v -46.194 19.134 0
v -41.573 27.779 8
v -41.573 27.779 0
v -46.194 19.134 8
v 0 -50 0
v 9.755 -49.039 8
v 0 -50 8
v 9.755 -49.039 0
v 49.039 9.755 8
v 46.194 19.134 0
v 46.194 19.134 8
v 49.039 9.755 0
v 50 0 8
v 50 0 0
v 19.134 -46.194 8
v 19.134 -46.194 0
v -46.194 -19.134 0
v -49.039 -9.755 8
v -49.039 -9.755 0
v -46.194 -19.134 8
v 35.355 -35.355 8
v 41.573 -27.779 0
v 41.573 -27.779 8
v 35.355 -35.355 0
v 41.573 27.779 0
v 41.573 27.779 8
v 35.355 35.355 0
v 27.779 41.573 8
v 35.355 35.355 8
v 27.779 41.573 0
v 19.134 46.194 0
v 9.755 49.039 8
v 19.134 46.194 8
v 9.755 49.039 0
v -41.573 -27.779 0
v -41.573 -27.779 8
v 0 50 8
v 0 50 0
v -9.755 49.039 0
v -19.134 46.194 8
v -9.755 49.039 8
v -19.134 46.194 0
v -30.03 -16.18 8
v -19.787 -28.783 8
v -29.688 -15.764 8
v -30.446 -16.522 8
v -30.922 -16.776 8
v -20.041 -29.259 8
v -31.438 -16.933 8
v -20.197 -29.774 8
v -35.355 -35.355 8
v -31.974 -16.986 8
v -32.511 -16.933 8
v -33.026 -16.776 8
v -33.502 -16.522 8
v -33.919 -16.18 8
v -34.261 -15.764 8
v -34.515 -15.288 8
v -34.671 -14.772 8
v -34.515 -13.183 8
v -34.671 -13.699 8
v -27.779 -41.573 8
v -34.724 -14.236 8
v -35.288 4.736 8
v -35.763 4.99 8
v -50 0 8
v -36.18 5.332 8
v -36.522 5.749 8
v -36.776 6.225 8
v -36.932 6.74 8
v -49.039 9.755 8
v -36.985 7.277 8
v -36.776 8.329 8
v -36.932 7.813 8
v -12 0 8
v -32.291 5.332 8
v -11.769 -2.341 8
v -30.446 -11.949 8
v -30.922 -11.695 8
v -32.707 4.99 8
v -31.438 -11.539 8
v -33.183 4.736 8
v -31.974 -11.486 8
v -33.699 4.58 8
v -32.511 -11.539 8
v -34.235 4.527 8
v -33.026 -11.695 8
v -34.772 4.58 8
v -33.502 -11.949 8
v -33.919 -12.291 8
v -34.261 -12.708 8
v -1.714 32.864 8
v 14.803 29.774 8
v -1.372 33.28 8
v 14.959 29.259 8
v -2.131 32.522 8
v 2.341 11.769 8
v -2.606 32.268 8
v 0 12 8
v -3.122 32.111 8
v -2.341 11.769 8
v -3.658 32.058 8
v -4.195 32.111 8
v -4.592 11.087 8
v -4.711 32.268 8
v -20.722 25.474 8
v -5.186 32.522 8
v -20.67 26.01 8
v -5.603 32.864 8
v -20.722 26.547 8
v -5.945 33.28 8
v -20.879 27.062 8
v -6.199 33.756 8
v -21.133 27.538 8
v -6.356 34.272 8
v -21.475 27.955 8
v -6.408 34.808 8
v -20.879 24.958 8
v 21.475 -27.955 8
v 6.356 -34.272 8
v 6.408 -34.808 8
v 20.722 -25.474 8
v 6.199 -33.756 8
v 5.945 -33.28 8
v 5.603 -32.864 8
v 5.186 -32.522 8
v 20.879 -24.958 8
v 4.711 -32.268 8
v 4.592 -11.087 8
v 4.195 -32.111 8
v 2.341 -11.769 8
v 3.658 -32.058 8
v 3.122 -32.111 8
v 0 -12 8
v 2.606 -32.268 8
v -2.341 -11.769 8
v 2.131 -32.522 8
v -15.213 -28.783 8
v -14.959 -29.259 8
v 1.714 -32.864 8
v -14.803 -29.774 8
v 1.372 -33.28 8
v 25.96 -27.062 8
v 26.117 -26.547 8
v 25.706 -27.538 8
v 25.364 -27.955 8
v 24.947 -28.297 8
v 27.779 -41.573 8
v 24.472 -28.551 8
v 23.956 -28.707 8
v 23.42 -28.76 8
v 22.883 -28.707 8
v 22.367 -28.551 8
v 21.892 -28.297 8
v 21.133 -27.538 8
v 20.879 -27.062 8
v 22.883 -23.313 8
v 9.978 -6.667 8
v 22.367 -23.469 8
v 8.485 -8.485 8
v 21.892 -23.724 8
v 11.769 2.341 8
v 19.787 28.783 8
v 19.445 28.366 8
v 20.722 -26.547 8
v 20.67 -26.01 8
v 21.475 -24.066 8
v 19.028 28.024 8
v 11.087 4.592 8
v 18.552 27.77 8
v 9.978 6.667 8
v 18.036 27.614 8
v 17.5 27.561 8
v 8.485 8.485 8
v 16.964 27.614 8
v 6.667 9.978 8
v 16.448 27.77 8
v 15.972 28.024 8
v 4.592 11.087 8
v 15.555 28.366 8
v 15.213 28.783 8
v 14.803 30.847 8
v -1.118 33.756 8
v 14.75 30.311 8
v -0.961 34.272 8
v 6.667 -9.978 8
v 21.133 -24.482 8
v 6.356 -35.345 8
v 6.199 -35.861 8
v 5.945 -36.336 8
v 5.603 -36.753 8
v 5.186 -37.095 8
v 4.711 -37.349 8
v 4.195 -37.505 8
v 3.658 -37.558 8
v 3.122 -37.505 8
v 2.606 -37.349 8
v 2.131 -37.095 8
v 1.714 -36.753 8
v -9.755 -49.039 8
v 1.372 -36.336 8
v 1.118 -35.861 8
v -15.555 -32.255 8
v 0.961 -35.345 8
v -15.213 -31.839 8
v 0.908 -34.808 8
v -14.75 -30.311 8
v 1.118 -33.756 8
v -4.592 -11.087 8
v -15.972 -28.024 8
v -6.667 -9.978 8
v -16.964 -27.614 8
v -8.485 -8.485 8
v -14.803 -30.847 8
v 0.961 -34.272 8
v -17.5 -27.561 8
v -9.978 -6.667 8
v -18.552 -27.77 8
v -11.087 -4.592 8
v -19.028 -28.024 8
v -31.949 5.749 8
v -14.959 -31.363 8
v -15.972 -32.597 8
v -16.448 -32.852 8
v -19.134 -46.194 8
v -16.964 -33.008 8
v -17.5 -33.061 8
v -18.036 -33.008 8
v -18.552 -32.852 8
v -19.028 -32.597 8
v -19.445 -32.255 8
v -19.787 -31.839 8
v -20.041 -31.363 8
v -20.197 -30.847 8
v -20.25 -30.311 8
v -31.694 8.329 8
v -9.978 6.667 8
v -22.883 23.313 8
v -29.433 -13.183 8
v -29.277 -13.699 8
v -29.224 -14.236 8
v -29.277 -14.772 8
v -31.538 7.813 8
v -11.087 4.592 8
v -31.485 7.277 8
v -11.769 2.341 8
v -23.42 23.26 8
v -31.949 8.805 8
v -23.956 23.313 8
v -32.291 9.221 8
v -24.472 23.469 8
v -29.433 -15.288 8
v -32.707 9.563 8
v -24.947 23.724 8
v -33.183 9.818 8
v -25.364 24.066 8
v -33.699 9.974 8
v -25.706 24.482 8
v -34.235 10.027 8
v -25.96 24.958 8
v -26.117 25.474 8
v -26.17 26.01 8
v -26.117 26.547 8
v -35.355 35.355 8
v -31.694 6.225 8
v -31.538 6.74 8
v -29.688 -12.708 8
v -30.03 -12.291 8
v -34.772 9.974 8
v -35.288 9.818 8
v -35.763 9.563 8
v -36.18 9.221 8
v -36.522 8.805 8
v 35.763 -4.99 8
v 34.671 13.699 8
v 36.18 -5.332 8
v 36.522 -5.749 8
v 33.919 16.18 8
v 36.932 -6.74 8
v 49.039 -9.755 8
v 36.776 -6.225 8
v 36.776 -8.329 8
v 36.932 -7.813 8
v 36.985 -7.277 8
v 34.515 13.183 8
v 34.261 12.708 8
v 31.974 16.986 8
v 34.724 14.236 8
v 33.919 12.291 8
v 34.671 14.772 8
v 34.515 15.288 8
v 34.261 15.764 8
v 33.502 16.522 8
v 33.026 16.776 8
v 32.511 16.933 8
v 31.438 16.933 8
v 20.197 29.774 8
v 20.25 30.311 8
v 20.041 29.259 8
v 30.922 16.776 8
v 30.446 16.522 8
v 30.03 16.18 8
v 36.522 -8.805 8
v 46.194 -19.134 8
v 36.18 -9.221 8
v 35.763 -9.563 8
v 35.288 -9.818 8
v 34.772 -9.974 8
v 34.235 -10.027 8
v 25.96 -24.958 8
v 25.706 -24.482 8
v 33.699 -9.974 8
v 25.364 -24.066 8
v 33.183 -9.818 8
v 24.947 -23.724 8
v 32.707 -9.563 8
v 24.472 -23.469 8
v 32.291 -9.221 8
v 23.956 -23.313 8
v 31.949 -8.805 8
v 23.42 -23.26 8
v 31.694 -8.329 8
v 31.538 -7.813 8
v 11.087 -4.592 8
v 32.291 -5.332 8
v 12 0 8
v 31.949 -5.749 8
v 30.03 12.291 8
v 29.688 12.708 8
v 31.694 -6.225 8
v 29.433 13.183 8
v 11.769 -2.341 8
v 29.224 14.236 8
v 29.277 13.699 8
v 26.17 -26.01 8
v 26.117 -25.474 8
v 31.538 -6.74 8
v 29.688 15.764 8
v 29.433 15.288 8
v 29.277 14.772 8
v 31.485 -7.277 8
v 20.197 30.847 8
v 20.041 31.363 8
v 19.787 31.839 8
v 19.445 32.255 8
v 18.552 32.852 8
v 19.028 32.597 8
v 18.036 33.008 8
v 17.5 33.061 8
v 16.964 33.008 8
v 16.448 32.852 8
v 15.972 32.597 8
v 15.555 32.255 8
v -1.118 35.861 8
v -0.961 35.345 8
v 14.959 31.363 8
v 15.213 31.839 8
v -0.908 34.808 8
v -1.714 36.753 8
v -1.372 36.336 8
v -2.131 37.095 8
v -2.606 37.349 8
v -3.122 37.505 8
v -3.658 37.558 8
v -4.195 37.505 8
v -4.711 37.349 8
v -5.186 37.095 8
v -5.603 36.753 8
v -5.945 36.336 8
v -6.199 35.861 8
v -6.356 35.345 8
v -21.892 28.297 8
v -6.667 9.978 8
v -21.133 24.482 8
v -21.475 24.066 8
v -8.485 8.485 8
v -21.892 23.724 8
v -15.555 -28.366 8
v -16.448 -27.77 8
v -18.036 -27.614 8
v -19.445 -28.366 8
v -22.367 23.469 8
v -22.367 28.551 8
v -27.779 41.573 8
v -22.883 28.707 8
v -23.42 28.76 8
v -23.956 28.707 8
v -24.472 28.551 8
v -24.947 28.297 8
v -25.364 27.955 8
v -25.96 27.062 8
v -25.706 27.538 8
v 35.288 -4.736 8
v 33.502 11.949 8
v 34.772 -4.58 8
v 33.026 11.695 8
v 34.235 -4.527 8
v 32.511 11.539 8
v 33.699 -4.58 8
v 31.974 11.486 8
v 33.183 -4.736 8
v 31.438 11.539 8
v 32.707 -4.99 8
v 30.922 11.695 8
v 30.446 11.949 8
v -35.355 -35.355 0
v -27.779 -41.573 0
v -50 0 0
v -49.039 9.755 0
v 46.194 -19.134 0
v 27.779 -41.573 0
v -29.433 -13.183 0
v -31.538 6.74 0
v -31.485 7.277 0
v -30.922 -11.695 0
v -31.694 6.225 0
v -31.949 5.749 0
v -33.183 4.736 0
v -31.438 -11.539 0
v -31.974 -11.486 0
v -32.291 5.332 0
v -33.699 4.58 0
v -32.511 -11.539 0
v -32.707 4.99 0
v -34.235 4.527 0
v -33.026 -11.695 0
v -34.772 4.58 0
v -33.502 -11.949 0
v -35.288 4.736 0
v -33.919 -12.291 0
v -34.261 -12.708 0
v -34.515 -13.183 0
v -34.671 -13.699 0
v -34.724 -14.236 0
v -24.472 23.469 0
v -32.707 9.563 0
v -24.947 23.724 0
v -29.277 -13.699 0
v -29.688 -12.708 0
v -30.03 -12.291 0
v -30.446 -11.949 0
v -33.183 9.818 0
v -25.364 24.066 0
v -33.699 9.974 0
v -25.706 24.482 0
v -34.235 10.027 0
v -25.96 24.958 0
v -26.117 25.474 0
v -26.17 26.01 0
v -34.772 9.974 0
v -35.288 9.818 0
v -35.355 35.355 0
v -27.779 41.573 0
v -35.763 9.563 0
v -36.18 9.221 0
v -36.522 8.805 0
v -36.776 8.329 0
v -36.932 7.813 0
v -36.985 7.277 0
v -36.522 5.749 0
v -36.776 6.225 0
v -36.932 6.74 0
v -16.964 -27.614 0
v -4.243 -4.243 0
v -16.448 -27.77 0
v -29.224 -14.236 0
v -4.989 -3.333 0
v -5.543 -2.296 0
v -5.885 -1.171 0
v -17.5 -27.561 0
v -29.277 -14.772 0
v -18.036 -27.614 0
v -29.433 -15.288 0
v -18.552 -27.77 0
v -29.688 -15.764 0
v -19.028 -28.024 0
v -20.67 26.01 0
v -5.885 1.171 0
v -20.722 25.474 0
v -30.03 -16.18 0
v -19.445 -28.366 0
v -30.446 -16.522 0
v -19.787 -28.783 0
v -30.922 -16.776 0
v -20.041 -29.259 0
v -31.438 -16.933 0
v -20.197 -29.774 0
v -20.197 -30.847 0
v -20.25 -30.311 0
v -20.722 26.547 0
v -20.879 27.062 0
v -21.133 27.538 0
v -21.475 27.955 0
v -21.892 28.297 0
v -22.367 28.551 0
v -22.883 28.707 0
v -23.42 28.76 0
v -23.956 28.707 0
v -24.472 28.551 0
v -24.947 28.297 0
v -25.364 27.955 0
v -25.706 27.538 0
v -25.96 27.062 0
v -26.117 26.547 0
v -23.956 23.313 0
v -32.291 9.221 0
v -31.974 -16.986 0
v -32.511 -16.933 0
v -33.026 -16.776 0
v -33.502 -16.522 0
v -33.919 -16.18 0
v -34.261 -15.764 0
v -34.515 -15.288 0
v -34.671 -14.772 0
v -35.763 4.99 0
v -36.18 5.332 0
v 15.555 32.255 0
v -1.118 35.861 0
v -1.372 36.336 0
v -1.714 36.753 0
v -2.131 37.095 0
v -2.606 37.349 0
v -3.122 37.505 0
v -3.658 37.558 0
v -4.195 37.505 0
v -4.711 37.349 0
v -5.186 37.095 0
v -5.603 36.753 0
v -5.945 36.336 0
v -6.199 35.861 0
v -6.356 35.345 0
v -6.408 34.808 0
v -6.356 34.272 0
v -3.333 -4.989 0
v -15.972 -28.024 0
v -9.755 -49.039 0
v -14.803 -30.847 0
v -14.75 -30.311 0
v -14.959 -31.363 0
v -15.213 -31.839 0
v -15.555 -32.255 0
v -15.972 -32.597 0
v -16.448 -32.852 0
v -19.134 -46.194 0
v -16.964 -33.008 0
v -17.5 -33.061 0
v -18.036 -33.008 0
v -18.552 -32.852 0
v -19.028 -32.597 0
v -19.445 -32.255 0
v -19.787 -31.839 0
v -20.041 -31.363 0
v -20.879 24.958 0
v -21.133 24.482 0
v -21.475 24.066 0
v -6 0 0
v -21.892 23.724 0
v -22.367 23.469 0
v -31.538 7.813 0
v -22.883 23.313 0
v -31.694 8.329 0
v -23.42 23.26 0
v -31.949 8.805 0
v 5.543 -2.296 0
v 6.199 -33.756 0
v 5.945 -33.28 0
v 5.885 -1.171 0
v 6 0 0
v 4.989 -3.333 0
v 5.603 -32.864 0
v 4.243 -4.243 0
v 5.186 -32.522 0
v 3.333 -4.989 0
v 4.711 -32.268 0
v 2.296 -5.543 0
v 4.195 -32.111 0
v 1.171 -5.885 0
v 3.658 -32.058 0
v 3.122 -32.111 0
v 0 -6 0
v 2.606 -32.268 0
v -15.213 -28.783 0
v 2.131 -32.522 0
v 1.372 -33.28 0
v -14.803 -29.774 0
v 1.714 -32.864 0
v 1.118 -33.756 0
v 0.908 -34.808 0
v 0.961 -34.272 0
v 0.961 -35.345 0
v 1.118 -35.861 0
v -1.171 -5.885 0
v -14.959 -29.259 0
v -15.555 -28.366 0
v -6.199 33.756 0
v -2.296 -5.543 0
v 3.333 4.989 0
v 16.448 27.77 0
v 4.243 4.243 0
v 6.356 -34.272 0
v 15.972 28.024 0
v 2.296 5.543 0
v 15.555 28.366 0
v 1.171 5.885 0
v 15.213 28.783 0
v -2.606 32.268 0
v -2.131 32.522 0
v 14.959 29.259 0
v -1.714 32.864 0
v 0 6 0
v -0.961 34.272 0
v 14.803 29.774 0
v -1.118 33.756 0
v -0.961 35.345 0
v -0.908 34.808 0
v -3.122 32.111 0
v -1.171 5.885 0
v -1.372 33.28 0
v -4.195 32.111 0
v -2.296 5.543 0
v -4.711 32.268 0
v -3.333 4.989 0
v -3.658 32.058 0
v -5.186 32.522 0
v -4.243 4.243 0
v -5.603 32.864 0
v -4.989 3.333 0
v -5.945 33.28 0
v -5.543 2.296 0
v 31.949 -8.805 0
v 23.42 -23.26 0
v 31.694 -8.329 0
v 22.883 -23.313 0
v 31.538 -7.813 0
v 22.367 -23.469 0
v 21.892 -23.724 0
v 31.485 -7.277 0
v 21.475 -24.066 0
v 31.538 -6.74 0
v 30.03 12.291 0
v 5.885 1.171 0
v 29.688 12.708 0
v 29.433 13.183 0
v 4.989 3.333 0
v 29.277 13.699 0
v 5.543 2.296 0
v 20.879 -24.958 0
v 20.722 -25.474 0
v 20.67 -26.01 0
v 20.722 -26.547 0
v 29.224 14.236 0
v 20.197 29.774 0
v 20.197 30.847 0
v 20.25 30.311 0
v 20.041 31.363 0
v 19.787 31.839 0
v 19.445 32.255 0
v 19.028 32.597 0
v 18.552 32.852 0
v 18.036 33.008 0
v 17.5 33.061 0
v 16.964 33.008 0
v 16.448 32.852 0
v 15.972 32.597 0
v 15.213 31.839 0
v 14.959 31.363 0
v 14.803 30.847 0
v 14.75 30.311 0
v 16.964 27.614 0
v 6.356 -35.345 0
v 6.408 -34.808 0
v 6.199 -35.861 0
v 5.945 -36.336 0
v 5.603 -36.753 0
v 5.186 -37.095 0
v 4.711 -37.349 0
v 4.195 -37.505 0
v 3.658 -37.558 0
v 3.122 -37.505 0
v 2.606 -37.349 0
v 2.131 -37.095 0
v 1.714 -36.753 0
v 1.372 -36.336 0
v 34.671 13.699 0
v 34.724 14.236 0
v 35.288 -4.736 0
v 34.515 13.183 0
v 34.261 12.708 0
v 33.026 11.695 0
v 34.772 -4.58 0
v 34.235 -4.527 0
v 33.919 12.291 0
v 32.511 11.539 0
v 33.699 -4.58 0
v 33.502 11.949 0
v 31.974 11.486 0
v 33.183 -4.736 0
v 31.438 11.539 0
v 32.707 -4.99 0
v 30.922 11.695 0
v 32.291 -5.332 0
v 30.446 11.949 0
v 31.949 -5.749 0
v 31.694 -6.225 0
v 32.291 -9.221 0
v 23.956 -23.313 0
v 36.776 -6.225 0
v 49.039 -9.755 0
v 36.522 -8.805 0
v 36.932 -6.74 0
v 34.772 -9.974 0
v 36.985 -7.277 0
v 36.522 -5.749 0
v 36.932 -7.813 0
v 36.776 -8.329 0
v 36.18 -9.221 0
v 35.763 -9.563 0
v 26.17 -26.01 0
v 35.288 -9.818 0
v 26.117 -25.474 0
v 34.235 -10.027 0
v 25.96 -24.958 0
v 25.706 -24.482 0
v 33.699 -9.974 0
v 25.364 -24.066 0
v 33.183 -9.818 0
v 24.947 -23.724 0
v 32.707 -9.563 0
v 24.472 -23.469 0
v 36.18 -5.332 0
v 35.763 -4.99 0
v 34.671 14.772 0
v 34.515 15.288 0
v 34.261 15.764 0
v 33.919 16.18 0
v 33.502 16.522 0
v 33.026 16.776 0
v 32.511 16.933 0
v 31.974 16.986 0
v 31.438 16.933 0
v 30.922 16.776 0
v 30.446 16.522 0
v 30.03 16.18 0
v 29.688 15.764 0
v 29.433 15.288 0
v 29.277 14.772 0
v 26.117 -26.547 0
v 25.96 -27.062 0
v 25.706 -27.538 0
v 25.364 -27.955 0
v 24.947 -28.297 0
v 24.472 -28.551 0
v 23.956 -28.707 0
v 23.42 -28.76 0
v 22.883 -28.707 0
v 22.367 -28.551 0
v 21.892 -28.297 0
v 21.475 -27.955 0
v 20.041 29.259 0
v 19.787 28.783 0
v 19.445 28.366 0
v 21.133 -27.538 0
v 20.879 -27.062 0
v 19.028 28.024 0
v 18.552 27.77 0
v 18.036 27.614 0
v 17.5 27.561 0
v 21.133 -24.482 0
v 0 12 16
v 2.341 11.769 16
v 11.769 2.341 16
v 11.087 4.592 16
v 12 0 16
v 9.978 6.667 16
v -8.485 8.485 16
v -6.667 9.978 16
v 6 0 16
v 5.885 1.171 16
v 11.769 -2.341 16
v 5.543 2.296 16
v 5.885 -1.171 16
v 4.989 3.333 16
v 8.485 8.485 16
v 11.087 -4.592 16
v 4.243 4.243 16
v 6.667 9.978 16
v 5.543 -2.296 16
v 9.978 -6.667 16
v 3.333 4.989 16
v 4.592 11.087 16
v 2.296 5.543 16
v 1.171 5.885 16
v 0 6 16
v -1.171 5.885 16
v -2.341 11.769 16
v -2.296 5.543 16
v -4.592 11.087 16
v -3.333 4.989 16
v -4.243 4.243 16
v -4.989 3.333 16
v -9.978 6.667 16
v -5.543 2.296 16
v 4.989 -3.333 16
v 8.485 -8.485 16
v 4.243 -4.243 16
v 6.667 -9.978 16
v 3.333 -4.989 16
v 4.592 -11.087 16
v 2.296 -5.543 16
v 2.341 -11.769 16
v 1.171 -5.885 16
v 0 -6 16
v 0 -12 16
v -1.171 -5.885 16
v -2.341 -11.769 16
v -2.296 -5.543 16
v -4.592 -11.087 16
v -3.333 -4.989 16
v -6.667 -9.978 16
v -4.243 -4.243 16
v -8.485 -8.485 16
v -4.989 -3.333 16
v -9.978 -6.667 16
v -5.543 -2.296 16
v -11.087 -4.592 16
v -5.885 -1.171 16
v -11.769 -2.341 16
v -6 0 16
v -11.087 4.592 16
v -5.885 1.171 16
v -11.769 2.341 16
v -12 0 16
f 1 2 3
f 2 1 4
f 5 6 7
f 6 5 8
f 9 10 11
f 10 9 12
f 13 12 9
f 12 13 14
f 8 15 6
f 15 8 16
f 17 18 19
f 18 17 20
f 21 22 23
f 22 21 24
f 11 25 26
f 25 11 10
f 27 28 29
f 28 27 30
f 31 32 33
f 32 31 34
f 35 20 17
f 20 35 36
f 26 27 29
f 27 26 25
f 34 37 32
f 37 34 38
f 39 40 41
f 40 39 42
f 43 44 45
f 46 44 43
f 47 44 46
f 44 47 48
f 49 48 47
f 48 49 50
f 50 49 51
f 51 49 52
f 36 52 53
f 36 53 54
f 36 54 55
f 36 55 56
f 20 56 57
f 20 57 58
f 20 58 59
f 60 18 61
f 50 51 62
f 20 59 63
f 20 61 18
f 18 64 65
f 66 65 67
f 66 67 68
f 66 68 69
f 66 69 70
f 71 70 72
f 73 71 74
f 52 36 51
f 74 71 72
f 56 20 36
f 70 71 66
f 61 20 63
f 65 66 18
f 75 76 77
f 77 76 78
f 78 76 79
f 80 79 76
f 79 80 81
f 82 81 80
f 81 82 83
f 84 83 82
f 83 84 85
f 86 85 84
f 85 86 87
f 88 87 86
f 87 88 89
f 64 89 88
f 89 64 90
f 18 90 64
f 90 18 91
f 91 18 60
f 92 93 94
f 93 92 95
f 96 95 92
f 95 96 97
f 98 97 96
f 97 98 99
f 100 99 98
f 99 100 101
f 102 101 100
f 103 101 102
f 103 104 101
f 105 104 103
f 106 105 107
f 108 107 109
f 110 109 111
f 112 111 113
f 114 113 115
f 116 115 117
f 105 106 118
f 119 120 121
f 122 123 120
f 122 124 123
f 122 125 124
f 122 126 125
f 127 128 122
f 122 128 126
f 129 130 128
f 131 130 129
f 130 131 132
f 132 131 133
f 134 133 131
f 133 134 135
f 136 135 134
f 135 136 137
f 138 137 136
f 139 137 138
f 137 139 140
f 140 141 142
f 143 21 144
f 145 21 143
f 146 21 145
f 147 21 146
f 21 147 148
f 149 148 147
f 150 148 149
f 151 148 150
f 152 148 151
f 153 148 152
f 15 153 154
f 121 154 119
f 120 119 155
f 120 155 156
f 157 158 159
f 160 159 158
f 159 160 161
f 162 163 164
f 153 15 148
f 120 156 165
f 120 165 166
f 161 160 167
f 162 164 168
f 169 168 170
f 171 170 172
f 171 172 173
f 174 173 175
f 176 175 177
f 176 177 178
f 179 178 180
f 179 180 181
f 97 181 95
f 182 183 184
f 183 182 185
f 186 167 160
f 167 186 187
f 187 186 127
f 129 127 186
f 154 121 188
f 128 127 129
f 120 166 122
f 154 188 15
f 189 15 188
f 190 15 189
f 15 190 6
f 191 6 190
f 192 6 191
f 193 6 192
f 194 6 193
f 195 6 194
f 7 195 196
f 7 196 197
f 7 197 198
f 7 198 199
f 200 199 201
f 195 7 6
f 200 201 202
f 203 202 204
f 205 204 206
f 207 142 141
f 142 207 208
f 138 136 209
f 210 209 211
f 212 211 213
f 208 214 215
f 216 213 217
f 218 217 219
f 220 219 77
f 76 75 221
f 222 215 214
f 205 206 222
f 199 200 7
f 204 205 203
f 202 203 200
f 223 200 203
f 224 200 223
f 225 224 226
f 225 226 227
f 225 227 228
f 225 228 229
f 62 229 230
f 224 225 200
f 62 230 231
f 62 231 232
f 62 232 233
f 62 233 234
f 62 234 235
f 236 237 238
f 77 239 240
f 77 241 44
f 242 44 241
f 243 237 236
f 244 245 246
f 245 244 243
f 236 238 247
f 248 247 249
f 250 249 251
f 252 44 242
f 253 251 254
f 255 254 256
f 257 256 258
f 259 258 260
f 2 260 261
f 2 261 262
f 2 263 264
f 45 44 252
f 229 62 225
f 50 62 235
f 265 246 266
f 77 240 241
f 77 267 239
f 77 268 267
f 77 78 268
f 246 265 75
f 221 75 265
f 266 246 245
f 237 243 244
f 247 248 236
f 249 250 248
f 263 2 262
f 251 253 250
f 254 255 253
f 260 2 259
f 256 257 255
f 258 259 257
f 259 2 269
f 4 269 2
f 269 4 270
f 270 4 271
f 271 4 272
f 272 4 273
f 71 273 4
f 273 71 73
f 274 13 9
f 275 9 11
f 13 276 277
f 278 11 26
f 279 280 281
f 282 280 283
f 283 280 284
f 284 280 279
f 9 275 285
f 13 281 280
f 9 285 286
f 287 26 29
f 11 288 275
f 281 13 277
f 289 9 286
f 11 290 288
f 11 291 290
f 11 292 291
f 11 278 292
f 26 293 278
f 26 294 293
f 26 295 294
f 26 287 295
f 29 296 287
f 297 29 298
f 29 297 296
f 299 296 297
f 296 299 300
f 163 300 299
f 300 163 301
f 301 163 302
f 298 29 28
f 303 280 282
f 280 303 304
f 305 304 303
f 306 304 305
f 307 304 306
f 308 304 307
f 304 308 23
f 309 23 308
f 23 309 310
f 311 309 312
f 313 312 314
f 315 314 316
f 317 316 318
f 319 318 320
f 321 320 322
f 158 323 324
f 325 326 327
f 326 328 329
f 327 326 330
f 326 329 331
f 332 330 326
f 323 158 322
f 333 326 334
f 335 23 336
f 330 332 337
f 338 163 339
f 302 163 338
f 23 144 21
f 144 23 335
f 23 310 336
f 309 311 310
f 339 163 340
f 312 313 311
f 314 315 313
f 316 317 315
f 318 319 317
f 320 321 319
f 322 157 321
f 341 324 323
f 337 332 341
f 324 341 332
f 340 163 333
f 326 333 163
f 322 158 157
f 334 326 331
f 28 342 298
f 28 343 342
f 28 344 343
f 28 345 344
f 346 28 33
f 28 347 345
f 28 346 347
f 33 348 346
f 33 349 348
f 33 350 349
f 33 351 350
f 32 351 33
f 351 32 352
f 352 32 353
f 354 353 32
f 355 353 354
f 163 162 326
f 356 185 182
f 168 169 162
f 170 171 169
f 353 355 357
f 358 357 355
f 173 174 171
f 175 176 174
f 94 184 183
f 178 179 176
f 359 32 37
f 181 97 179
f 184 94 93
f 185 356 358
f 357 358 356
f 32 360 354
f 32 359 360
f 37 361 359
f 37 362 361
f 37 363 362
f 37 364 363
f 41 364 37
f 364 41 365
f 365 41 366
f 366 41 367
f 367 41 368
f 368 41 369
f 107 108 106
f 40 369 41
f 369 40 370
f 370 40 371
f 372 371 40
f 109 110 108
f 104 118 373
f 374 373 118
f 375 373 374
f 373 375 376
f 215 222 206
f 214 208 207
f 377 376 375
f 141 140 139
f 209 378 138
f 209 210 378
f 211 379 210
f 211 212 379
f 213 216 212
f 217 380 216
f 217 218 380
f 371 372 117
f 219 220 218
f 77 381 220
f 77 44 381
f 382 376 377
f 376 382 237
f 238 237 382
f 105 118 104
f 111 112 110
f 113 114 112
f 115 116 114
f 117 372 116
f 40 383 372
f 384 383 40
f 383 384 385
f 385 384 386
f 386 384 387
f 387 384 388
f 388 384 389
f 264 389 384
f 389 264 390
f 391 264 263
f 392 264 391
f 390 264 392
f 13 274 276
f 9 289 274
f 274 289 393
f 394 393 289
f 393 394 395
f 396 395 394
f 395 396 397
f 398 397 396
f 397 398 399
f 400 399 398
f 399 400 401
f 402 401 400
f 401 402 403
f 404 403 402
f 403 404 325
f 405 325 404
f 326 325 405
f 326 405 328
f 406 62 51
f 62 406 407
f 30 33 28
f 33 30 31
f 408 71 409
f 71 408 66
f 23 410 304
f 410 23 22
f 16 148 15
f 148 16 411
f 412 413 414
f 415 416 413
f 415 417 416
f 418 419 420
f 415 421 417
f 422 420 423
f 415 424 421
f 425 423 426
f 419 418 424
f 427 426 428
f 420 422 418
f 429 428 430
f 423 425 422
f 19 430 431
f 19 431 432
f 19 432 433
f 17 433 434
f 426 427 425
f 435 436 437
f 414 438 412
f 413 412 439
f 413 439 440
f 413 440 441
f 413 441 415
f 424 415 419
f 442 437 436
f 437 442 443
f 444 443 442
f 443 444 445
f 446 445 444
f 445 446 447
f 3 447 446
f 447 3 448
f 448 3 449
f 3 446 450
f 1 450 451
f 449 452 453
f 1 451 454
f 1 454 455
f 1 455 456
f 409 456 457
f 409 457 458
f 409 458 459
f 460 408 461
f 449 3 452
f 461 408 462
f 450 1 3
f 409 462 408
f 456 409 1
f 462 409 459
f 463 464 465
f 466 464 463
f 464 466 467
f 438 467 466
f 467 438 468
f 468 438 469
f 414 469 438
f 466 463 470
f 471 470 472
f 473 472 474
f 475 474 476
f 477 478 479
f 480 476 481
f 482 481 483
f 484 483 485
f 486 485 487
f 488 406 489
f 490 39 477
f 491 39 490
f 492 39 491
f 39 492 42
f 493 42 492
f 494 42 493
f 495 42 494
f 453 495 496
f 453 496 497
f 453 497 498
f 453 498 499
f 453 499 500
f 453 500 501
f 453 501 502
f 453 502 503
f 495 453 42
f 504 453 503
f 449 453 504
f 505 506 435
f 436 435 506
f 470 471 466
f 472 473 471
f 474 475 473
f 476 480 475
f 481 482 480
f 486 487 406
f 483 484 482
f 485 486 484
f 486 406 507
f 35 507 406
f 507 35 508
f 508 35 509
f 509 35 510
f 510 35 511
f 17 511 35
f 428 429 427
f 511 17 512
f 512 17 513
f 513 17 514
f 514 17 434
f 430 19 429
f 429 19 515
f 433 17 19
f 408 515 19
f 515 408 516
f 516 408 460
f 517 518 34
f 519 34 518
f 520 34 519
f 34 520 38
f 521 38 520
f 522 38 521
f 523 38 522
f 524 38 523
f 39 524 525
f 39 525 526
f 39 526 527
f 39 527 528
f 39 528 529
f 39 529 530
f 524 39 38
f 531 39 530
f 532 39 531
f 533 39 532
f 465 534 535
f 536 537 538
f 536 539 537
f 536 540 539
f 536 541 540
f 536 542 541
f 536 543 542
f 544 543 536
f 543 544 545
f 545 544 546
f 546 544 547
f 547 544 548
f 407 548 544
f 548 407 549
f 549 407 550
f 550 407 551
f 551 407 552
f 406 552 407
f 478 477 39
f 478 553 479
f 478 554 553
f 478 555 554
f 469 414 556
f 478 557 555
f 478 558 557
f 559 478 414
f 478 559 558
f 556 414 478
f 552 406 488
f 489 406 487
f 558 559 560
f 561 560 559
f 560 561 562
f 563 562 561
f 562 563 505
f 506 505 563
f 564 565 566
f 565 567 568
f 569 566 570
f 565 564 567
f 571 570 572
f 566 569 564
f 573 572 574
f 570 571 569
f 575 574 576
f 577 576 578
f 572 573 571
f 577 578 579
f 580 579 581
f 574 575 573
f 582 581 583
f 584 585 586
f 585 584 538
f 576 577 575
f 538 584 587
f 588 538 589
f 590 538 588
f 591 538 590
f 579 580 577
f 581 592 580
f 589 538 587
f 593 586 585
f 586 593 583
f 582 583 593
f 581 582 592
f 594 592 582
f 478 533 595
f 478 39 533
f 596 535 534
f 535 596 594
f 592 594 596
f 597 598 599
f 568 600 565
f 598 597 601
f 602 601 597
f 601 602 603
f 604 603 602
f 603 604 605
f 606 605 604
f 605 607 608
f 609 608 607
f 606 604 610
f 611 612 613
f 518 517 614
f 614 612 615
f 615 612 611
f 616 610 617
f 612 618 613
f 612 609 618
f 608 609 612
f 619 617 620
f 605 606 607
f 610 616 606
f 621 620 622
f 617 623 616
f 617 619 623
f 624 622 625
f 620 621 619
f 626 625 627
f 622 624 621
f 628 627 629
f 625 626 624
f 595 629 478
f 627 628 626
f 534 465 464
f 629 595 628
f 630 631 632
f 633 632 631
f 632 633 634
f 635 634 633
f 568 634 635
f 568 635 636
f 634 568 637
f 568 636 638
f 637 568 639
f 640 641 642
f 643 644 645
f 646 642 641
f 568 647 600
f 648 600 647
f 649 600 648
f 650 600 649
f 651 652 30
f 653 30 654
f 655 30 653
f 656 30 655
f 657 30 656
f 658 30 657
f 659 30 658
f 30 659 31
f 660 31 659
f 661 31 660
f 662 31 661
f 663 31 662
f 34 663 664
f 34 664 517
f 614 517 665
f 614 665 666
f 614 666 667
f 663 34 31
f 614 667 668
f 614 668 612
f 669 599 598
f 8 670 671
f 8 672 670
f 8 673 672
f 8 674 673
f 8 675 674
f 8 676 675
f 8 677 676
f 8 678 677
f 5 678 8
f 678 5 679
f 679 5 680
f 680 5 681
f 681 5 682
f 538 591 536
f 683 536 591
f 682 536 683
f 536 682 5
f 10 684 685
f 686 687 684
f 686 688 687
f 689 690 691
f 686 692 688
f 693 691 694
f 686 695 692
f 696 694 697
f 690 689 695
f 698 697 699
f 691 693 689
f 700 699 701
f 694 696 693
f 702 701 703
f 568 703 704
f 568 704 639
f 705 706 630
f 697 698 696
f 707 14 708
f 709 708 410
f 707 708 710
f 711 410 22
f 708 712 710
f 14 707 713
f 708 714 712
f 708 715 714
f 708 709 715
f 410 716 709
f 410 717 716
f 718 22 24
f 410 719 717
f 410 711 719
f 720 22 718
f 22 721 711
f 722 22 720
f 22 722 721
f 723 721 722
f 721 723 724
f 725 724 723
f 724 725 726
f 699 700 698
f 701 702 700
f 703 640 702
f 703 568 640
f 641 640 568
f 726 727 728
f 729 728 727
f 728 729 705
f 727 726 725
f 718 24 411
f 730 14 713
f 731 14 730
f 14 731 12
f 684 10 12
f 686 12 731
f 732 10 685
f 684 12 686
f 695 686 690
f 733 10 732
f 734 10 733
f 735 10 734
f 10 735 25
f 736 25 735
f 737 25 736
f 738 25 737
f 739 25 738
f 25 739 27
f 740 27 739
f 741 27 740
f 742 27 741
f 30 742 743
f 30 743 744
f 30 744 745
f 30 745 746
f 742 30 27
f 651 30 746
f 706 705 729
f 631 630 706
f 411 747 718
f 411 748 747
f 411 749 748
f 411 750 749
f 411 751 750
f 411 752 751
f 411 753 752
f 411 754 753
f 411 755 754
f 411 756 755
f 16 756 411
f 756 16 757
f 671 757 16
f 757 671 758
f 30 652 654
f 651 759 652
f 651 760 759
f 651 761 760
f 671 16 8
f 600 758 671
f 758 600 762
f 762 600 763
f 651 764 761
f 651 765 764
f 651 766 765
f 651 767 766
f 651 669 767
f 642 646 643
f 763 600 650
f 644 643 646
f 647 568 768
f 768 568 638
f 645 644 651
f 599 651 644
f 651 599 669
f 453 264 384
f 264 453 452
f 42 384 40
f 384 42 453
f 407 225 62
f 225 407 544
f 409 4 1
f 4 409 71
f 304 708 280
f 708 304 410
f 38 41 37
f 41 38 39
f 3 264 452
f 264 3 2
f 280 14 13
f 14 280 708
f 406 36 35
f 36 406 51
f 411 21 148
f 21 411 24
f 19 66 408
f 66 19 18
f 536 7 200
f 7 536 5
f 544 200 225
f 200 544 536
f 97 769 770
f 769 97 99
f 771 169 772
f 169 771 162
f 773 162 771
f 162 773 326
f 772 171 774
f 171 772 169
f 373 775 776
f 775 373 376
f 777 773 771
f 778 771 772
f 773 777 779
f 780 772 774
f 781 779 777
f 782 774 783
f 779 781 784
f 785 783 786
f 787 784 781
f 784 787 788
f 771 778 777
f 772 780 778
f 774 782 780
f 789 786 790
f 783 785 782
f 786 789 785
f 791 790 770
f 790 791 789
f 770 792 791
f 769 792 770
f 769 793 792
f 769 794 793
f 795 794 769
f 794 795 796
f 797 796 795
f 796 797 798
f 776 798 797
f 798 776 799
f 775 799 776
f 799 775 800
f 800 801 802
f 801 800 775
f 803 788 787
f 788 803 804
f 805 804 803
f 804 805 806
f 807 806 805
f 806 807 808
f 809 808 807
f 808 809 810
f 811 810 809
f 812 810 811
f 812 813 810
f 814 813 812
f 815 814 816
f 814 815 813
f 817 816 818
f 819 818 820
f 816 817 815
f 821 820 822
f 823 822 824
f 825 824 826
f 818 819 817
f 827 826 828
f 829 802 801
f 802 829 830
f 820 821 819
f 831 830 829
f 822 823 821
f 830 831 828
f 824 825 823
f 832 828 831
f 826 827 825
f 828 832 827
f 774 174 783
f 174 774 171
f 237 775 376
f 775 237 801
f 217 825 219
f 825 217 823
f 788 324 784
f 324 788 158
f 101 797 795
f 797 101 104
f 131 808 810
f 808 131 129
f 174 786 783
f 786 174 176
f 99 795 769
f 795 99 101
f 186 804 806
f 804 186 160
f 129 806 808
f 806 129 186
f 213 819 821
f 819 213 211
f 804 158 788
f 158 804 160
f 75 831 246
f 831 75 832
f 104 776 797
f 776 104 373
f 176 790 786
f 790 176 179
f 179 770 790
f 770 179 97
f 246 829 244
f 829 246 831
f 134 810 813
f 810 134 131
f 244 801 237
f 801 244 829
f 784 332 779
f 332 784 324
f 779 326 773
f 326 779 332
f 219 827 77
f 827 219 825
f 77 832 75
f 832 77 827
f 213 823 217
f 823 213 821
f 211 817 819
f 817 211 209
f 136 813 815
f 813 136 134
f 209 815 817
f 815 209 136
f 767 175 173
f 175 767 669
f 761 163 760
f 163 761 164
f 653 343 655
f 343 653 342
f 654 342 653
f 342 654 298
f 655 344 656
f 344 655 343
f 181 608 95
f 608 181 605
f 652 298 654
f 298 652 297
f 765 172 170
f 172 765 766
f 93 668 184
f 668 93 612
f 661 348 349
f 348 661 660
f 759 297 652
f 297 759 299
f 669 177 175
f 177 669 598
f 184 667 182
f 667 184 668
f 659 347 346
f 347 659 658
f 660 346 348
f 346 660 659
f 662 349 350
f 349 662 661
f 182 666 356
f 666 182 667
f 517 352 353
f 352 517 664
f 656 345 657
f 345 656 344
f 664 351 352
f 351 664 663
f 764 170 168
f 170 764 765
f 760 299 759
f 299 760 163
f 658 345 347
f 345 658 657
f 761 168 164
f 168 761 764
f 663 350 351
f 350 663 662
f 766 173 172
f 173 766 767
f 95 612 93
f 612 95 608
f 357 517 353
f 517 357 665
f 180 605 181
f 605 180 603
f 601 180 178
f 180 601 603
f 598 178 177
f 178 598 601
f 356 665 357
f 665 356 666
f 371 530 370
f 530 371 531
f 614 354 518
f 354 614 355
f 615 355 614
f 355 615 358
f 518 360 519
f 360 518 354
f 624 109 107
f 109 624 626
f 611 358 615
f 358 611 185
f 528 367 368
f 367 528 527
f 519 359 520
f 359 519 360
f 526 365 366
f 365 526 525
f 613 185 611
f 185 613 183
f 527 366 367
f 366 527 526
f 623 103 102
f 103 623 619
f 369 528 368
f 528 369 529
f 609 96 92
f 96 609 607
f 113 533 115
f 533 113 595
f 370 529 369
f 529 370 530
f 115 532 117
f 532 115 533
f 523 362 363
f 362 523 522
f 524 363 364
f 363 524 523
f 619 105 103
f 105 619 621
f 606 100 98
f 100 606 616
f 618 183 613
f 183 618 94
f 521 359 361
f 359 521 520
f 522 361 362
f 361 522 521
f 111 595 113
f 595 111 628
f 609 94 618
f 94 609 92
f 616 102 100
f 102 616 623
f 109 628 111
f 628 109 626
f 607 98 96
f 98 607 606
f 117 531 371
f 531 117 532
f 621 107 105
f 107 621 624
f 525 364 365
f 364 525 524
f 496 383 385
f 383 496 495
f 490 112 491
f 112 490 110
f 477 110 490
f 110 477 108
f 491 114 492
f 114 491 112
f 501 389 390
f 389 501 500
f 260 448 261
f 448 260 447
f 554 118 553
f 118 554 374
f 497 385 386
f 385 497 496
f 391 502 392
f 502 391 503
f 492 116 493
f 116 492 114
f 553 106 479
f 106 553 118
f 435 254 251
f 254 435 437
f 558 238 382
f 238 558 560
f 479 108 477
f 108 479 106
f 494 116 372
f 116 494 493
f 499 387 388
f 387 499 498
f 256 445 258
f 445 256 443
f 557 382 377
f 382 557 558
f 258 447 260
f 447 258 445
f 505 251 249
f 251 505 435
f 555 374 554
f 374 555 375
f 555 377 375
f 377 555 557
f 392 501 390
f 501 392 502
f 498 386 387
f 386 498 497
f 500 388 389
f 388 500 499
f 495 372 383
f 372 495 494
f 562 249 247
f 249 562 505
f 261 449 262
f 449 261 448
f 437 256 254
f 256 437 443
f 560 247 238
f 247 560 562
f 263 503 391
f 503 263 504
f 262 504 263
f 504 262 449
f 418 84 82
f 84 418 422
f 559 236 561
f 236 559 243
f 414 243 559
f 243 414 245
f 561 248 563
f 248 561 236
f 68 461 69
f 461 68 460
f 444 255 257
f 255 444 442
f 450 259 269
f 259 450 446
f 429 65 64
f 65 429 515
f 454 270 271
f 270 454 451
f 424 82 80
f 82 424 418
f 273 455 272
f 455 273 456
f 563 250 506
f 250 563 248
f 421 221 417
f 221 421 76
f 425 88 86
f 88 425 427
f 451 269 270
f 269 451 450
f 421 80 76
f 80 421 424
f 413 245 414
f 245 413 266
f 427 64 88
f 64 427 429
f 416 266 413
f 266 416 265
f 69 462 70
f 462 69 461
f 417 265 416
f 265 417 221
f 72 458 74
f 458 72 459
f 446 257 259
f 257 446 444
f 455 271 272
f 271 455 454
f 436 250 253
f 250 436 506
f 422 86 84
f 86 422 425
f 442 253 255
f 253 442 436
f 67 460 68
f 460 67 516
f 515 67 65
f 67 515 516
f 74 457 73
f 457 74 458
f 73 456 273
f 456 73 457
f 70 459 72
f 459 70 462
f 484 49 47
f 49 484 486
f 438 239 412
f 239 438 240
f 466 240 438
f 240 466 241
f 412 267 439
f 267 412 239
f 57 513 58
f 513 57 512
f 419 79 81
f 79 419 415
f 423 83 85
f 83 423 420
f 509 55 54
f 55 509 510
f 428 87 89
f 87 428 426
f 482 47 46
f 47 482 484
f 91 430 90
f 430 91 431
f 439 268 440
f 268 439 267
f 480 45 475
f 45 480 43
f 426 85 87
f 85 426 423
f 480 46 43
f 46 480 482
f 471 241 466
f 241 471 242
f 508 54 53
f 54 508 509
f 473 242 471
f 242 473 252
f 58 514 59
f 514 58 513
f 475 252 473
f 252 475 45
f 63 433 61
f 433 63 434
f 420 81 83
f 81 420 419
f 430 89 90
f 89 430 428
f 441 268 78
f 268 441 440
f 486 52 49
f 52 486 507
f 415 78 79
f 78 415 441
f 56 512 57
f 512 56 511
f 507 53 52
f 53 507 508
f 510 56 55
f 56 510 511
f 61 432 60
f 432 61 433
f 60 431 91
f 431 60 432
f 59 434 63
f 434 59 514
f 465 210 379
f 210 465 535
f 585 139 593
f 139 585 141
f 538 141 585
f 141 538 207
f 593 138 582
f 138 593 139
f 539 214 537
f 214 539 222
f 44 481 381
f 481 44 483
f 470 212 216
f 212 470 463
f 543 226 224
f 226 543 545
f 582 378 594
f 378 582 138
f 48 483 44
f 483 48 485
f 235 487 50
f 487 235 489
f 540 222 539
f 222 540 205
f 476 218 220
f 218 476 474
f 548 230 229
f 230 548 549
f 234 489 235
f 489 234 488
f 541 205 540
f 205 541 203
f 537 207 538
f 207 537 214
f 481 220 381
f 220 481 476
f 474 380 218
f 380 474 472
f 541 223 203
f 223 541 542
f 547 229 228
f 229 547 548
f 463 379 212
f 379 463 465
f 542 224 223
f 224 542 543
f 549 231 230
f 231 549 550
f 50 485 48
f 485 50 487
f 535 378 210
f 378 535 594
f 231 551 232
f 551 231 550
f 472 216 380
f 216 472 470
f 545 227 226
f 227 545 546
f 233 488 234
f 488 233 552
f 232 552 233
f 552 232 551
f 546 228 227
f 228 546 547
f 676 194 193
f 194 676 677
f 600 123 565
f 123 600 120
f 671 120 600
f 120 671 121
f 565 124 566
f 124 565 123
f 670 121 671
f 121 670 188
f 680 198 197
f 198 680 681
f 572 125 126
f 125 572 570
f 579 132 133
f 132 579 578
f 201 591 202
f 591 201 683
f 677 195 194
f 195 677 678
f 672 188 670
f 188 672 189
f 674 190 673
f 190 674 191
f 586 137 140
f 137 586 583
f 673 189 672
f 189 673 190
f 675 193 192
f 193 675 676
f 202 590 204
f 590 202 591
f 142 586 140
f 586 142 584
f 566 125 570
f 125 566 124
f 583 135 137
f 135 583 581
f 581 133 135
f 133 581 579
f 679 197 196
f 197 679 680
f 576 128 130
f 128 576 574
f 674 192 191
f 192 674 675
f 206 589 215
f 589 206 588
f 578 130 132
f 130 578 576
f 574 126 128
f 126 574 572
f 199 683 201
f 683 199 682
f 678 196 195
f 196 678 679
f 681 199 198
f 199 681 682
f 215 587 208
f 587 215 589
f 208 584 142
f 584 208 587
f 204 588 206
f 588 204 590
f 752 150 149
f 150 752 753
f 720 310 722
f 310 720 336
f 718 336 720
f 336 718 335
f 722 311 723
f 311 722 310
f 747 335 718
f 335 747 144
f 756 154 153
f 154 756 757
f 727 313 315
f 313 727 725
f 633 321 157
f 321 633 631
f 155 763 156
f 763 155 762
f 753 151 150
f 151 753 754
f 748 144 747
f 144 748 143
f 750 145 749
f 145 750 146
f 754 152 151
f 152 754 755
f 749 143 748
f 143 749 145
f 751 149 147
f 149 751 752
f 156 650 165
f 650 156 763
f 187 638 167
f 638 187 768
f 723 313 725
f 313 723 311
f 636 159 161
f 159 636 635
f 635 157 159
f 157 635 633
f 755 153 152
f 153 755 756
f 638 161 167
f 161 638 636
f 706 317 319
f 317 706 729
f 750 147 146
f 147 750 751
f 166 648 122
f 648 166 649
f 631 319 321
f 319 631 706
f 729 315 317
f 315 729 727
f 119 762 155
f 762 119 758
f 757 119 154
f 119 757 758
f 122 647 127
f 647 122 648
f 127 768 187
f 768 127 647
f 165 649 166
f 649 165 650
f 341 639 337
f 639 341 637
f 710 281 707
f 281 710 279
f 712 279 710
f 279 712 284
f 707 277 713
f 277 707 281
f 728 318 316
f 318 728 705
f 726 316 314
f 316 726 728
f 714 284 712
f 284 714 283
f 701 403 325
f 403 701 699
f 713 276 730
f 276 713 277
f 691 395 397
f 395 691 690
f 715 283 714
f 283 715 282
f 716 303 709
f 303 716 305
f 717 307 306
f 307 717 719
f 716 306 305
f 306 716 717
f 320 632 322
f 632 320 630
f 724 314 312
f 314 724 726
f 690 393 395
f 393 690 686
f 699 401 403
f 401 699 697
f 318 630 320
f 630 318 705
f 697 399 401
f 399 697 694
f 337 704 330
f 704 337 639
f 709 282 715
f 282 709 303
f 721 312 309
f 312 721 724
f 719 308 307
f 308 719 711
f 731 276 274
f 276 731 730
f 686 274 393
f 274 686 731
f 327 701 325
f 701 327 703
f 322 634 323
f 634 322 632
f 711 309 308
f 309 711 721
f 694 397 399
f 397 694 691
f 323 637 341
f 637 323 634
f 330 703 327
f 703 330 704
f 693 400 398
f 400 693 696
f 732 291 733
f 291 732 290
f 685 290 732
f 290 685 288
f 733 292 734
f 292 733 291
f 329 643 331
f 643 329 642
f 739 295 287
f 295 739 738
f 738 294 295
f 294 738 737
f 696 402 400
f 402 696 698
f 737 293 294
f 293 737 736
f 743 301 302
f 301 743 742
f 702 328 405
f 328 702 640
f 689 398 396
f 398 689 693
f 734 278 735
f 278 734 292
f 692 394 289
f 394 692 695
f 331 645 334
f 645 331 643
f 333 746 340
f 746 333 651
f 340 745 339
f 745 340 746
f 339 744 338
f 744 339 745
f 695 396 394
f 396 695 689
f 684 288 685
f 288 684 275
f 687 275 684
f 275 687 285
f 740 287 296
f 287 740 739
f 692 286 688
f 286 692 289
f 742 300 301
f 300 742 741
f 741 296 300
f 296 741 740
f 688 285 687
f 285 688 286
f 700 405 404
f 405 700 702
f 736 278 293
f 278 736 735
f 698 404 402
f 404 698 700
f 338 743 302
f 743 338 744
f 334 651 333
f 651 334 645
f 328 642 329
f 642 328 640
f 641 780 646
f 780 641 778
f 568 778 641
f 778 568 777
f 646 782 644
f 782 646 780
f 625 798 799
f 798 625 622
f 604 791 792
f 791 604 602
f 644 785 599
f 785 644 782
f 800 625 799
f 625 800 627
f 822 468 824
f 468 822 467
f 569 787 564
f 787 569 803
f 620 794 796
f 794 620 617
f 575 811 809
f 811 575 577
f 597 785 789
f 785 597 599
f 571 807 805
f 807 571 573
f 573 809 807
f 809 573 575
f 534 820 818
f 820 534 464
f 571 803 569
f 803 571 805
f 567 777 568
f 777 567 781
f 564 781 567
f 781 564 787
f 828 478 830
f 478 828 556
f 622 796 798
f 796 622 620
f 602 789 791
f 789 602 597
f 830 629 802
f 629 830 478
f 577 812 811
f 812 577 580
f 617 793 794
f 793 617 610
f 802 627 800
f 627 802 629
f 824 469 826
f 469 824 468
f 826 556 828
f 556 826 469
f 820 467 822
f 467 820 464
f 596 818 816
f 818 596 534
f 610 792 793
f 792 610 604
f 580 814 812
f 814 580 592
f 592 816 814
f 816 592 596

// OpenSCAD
$fn = 32;

// ----------------------------------------------------------------------
// Flange Ø100 x 8
// 10 holes on a Ø70 bolt circle, bolted joints
// ----------------------------------------------------------------------

// --- parameters (mm) ---
flange_d = 100;  // outside diameter of the flange
thickness = 8;   // flange thickness
holes = 10;      // number of bolt holes
pcd = 70;        // bolt circle diameter
start_deg = 60;  // angle of the first hole, from +X
hole_d = 5.5;    // bolt hole diameter
bore_d = 12;     // central through bore
hub_d = 24;      // hub outside diameter
hub_h = 8;       // hub height above the flange face (0 = no hub)

// --- derived feature positions (mm) ---
height = thickness + hub_h;  // = 16   overall height of the part
pcd_r = pcd / 2;             // = 35   bolt circle radius
hole_step = 360 / holes;     // = 36   angular pitch
feature_centers = [
  [pcd_r * cos(start_deg + 0 * hole_step), pcd_r * sin(start_deg + 0 * hole_step)],
  [pcd_r * cos(start_deg + 1 * hole_step), pcd_r * sin(start_deg + 1 * hole_step)],
  [pcd_r * cos(start_deg + 2 * hole_step), pcd_r * sin(start_deg + 2 * hole_step)],
  [pcd_r * cos(start_deg + 3 * hole_step), pcd_r * sin(start_deg + 3 * hole_step)],
  [pcd_r * cos(start_deg + 4 * hole_step), pcd_r * sin(start_deg + 4 * hole_step)],
  [pcd_r * cos(start_deg + 5 * hole_step), pcd_r * sin(start_deg + 5 * hole_step)],
  [pcd_r * cos(start_deg + 6 * hole_step), pcd_r * sin(start_deg + 6 * hole_step)],
  [pcd_r * cos(start_deg + 7 * hole_step), pcd_r * sin(start_deg + 7 * hole_step)],
  [pcd_r * cos(start_deg + 8 * hole_step), pcd_r * sin(start_deg + 8 * hole_step)],
  [pcd_r * cos(start_deg + 9 * hole_step), pcd_r * sin(start_deg + 9 * hole_step)]
];   // bolt hole centres on the pitch circle

// flange disc, every hole and the bore cut straight through
difference() {
  union() {
    cylinder(d = flange_d, h = thickness);
    cylinder(d = hub_d, h = height);  // hub, overlapped into the flange
  }
  translate([0, 0, -1]) cylinder(d = bore_d, h = height + 2);  // bore, through
  for (centre = feature_centers)
    translate([centre[0], centre[1], -1]) cylinder(d = hole_d, h = thickness + 2);
}
